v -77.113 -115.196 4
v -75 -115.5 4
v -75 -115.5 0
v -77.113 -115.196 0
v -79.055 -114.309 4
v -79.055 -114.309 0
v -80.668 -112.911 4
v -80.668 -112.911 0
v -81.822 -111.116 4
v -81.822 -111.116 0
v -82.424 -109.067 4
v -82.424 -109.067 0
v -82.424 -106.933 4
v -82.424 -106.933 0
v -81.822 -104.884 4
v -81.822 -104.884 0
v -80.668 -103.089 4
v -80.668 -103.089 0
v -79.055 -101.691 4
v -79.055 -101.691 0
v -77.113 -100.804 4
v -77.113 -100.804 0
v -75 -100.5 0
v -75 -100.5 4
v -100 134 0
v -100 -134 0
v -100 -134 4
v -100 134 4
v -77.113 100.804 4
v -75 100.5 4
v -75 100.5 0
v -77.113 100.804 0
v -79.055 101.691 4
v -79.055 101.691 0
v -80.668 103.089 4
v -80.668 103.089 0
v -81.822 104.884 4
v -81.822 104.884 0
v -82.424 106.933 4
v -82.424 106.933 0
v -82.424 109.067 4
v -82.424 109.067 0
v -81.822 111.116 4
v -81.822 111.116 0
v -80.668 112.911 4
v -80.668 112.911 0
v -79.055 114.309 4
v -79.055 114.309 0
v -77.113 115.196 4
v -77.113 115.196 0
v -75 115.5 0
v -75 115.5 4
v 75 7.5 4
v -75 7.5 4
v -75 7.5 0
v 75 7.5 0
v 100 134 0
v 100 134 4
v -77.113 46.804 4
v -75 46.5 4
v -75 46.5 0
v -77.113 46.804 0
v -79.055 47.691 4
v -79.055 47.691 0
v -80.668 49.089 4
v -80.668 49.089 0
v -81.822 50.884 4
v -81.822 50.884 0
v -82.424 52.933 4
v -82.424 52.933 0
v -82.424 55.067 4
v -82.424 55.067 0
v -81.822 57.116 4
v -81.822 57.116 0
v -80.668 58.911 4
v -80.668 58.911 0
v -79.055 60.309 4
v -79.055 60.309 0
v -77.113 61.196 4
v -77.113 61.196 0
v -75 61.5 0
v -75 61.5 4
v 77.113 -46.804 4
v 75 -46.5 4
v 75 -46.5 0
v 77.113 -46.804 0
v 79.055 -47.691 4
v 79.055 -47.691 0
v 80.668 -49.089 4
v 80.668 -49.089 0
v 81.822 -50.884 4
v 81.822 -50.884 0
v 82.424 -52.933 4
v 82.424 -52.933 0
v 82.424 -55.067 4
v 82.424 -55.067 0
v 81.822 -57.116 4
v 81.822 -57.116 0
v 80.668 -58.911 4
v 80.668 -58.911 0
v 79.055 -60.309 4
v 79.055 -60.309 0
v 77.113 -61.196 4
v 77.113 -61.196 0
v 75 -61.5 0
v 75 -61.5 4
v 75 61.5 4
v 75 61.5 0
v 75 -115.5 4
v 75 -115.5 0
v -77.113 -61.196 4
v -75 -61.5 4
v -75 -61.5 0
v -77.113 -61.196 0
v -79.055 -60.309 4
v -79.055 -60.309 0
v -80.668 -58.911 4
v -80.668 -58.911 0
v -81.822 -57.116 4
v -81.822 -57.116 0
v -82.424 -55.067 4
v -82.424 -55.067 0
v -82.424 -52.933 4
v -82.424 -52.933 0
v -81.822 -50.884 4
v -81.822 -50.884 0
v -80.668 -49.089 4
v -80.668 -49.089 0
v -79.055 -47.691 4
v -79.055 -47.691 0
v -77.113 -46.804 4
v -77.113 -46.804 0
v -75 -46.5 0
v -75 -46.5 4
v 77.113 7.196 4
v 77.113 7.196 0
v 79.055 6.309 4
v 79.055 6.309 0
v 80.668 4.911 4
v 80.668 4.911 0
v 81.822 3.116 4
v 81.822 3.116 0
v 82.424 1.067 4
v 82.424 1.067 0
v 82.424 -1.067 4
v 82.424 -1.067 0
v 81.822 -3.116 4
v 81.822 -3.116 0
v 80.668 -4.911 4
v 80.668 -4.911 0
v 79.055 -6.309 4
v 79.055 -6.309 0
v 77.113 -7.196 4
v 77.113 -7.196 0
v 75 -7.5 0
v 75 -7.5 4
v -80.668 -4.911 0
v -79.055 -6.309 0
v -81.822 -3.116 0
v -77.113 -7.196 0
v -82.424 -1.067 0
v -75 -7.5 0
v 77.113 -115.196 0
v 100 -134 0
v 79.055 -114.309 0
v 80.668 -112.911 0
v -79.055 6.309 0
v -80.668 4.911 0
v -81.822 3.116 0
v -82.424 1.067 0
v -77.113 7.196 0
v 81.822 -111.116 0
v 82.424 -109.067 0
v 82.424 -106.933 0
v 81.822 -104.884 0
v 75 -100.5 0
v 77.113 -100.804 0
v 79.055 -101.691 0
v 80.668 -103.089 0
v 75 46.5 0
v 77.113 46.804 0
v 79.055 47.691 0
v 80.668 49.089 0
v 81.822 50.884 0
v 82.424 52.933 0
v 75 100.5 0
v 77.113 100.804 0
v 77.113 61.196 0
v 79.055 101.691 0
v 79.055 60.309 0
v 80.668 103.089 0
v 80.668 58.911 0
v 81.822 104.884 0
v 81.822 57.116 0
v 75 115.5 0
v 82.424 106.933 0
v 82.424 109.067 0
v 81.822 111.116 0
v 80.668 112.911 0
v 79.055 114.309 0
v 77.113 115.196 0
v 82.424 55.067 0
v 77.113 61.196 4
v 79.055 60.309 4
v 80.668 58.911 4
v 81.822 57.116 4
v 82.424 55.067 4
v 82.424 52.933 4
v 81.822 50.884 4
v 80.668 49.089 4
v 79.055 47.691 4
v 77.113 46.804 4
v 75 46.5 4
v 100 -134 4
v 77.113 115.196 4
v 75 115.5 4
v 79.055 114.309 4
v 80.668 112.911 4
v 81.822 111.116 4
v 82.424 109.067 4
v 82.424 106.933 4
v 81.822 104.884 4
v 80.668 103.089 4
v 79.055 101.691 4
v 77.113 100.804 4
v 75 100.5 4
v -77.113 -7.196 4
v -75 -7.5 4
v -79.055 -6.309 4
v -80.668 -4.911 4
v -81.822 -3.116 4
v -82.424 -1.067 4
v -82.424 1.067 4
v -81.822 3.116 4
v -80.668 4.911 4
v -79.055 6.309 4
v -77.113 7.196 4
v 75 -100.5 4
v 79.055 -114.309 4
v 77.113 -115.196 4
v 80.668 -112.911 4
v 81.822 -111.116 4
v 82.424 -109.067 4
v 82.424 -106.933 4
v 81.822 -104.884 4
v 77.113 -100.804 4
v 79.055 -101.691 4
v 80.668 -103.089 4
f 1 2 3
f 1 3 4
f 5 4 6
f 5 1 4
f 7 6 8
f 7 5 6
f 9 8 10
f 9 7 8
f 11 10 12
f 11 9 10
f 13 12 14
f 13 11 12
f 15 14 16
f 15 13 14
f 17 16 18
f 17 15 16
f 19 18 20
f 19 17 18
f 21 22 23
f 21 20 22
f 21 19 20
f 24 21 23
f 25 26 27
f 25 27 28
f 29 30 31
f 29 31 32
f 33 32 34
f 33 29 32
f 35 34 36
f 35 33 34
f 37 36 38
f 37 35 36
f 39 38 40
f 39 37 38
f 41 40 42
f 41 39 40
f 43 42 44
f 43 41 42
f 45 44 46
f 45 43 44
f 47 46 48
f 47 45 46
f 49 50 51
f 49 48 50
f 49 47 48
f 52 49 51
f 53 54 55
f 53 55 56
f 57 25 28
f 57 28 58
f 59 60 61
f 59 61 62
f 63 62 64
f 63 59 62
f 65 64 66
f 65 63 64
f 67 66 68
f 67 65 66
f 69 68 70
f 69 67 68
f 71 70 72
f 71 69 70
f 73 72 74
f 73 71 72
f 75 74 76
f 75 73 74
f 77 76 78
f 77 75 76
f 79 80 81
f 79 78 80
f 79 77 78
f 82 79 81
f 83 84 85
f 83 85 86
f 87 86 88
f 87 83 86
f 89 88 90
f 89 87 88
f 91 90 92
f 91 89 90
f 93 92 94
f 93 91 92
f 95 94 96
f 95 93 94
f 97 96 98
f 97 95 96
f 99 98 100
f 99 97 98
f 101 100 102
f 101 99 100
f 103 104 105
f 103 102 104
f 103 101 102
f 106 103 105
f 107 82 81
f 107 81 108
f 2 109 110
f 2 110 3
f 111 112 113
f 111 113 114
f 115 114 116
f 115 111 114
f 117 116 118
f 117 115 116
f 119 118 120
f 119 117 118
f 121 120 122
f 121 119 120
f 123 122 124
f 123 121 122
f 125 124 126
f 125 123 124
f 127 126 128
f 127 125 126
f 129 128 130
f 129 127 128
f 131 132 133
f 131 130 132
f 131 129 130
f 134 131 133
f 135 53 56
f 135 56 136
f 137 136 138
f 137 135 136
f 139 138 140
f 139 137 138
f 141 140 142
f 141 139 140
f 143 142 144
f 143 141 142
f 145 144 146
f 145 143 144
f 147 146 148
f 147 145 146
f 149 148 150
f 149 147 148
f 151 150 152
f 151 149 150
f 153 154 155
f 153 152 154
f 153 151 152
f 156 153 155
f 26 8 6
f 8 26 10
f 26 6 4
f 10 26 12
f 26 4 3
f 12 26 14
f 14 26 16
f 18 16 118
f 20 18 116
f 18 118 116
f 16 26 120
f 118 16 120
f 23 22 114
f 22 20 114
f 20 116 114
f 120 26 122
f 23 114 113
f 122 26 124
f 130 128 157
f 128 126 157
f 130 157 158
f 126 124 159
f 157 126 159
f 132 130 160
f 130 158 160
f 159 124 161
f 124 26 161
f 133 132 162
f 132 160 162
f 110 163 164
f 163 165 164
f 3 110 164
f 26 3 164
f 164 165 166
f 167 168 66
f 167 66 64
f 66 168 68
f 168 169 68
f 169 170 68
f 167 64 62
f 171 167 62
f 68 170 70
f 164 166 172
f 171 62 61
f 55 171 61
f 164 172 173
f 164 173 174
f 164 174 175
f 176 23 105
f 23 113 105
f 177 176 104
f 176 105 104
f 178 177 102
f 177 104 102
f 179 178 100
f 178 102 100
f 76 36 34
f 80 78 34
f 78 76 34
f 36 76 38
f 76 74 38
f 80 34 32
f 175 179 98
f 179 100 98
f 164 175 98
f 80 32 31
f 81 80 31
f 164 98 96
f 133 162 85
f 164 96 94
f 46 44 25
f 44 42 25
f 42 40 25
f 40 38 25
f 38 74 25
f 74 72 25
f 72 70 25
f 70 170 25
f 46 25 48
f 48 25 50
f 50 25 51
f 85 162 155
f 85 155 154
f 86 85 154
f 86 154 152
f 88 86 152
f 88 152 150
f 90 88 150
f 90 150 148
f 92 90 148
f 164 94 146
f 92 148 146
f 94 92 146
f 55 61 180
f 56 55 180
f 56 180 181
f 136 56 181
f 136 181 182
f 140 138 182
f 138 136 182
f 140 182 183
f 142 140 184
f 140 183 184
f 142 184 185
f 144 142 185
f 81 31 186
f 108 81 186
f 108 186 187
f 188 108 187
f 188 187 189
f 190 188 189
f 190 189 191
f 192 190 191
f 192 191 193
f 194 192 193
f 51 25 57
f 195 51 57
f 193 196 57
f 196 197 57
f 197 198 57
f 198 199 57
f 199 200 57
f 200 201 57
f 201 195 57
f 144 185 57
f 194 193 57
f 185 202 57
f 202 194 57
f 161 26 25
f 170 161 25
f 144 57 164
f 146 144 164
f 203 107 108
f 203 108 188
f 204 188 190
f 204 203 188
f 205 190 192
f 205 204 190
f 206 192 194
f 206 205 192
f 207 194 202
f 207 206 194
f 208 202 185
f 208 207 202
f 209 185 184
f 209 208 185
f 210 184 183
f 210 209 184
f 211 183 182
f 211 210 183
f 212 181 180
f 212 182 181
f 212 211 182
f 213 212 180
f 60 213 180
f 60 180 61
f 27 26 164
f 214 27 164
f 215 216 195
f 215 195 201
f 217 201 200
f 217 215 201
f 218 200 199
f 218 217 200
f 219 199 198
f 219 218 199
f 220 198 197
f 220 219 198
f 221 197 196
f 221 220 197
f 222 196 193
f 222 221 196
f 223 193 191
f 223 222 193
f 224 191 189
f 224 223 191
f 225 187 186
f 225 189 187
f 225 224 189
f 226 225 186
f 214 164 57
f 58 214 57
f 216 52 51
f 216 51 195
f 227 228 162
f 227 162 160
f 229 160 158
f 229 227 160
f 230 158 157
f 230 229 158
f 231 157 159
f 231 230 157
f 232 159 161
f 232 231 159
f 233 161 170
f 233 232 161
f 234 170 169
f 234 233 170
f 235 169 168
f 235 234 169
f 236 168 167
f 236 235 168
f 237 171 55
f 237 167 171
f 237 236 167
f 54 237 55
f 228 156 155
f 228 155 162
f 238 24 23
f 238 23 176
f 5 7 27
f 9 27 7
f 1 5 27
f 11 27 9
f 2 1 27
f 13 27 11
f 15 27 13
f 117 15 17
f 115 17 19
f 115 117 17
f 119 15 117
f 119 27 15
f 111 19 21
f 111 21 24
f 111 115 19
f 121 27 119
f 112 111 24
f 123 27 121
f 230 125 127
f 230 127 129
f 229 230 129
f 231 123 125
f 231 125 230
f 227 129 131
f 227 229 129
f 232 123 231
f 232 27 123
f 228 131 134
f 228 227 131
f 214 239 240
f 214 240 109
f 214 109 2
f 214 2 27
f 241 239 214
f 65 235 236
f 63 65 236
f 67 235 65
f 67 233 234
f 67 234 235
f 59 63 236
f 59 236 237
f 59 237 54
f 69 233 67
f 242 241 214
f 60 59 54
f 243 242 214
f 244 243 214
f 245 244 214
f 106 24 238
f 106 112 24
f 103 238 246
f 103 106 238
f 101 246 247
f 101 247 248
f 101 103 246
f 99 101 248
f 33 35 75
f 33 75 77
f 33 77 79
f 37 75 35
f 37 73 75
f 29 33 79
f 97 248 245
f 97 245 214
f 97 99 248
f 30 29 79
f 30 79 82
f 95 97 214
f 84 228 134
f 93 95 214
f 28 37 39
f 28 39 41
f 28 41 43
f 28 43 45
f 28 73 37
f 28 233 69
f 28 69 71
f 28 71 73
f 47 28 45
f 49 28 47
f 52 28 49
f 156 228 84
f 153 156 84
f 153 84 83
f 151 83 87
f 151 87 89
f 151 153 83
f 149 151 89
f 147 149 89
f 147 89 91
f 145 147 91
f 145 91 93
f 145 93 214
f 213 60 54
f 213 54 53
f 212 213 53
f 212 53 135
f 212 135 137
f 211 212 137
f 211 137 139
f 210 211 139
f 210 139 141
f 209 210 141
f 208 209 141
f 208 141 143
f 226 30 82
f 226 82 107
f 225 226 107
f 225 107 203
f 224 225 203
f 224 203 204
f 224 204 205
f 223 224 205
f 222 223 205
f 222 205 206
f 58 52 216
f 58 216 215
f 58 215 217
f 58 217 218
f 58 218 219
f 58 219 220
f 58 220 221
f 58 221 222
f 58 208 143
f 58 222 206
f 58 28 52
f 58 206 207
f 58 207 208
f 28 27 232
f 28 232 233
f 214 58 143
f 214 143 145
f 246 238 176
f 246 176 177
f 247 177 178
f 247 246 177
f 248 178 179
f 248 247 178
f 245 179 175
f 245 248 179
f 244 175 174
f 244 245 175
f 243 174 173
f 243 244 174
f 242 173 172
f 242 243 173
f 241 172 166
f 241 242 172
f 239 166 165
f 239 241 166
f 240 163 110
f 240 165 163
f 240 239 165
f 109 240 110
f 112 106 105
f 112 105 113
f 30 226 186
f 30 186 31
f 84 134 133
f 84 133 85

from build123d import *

# Parameters (mm, degrees)
SKETCH_1_W          = 200
SKETCH_1_H          = 268
EXTRUDE_1_DEPTH     = 4
CUT_EXTRUDE_1_DEPTH = 5


with BuildPart() as part:
    # 草图1 → 凸台-拉伸1 (new body)
    with BuildSketch(Plane.XY):
        Rectangle(SKETCH_1_W, SKETCH_1_H)
    extrude(amount=EXTRUDE_1_DEPTH)

    # 草图2 → 切除-拉伸1 (cut, through all)
    with BuildSketch(Plane.XY.offset(4)):
        with BuildLine():
            Line((-75, 115.5), (75, 115.5))
            ThreePointArc((75, 115.5), (82.5, 108), (75, 100.5))
            Line((75, 100.5), (-75, 100.5))
            ThreePointArc((-75, 100.5), (-82.5, 108), (-75, 115.5))
        make_face()
        with BuildLine():
            Line((-75, 61.5), (75, 61.5))
            ThreePointArc((75, 61.5), (82.5, 54), (75, 46.5))
            Line((75, 46.5), (-75, 46.5))
            ThreePointArc((-75, 46.5), (-82.5, 54), (-75, 61.5))
        make_face()
        with BuildLine():
            Line((-75, 7.5), (75, 7.5))
            ThreePointArc((75, 7.5), (82.5, 0), (75, -7.5))
            Line((75, -7.5), (-75, -7.5))
            ThreePointArc((-75, -7.5), (-82.5, 0), (-75, 7.5))
        make_face()
        with BuildLine():
            Line((-75, -46.5), (75, -46.5))
            ThreePointArc((75, -46.5), (82.5, -54), (75, -61.5))
            Line((75, -61.5), (-75, -61.5))
            ThreePointArc((-75, -61.5), (-82.5, -54), (-75, -46.5))
        make_face()
        with BuildLine():
            Line((-75, -100.5), (75, -100.5))
            ThreePointArc((75, -100.5), (82.5, -108), (75, -115.5))
            Line((75, -115.5), (-75, -115.5))
            ThreePointArc((-75, -115.5), (-82.5, -108), (-75, -100.5))
        make_face()
    extrude(amount=-CUT_EXTRUDE_1_DEPTH, mode=Mode.SUBTRACT)


solid = part.part
